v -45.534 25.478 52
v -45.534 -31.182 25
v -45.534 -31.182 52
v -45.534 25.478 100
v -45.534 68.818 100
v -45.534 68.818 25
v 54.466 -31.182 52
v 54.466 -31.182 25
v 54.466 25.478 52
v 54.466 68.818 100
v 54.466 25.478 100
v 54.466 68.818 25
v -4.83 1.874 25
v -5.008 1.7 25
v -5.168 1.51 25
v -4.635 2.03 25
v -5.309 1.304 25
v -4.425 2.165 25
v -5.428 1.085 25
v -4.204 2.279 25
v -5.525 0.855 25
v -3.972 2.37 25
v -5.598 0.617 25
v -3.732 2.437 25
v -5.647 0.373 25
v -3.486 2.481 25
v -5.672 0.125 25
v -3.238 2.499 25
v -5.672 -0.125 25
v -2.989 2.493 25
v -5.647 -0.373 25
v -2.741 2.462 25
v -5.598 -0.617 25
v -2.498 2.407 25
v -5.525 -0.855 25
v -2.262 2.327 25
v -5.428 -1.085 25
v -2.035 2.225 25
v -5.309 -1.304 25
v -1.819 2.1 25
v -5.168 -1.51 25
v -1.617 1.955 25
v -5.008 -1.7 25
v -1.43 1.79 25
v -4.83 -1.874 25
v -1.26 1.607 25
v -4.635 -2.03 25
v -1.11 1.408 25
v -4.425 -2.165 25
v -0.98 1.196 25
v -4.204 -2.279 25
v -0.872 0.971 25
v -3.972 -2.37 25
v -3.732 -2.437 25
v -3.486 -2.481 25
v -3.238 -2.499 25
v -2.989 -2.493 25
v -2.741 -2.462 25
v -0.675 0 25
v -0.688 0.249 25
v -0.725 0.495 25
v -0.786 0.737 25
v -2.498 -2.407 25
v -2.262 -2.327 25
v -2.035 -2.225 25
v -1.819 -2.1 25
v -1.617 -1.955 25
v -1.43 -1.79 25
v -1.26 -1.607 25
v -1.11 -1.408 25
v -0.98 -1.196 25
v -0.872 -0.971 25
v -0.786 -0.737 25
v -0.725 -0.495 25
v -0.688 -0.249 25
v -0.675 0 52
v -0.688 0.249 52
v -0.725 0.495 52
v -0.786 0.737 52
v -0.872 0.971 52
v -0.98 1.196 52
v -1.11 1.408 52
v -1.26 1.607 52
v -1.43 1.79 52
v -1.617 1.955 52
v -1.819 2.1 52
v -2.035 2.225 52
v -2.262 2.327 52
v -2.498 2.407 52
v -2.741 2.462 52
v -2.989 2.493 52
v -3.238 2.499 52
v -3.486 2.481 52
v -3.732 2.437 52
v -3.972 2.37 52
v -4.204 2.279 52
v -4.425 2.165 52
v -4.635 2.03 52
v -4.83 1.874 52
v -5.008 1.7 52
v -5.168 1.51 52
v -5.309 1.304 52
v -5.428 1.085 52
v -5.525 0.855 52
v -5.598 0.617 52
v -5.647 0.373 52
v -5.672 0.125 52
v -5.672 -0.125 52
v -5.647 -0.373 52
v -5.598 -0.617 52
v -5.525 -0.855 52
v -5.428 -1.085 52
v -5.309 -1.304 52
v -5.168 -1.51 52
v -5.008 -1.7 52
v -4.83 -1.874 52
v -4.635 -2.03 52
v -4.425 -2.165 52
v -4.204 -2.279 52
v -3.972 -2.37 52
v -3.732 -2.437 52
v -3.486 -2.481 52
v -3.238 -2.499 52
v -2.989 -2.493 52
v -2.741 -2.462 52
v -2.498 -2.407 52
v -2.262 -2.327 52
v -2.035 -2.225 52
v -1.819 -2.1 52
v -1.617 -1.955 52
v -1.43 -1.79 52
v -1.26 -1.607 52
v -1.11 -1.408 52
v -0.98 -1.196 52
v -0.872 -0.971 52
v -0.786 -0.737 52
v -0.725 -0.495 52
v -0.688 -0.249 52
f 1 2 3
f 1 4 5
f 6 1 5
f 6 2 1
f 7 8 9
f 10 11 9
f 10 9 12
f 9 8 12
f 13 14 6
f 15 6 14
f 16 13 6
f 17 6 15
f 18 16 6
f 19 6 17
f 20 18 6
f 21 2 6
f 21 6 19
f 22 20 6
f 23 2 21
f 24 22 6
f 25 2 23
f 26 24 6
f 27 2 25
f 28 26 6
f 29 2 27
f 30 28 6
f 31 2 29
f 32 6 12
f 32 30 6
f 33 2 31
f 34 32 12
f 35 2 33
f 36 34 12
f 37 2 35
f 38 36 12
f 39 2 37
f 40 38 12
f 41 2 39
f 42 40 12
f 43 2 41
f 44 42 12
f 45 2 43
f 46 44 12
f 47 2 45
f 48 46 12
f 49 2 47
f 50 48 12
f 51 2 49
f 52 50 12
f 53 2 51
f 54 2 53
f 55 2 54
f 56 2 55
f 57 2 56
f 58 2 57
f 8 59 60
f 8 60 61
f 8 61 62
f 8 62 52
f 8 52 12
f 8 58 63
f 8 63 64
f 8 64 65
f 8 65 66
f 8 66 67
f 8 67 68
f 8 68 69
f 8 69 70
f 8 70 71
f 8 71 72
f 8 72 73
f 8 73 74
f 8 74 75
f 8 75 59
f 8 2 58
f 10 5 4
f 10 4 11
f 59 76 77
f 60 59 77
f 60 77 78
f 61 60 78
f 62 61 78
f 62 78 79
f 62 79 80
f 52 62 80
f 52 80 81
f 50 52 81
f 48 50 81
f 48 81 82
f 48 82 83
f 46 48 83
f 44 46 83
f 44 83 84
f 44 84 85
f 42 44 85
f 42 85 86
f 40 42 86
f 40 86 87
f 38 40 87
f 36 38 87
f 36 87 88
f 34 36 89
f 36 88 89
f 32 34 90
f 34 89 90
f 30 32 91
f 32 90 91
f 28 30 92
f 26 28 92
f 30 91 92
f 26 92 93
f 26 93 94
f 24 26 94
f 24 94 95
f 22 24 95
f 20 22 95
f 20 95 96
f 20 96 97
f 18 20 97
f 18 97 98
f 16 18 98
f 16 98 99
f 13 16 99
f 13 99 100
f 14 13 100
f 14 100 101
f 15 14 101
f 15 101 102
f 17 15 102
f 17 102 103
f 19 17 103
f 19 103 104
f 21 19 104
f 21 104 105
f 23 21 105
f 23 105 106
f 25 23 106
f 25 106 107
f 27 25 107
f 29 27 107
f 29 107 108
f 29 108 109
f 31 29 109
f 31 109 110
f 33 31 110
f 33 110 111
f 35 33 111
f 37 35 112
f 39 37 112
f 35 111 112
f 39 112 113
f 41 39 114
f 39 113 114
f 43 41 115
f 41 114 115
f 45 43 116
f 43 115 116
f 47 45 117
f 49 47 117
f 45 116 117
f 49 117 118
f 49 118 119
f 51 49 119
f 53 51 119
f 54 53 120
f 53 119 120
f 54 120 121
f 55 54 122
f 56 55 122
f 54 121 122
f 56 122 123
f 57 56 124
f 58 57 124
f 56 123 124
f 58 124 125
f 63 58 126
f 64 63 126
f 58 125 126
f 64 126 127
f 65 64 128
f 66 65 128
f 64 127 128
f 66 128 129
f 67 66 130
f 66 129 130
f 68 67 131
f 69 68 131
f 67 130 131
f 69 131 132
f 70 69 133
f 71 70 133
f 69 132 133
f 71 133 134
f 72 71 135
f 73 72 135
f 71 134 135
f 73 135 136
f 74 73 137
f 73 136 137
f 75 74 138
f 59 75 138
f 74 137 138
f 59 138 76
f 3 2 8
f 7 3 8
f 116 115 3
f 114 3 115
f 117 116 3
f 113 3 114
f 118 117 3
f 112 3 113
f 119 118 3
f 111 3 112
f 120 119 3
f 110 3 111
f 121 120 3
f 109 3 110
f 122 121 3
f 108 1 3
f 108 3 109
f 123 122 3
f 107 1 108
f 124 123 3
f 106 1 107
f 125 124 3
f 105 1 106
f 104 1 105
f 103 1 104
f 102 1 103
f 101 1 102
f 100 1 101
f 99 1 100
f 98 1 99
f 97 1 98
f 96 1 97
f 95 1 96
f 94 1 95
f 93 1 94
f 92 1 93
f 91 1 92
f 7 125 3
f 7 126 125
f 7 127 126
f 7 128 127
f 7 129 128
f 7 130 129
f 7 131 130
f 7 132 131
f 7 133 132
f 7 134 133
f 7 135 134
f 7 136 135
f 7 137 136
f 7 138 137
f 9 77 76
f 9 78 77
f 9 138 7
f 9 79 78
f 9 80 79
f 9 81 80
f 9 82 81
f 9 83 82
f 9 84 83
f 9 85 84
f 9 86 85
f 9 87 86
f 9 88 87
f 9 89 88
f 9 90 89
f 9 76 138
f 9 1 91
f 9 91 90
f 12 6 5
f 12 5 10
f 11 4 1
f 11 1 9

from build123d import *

# Parameters (mm, degrees)
F0_W     = 100
F0_H     = 100
F1_DEPTH = 100
F2_W     = 143.886555
F2_H     = 64.474793
F3_DEPTH = 48
F4_R     = 2.5
F5_DEPTH = 52.001
F6_W     = 124.598865
F6_H     = 122.024197
F7_DEPTH = 25


with BuildPart() as f1:
    # F0 (on Top) → F1 (new body)
    with BuildSketch(Plane.XY):
        with Locations((4.466346, 18.817768)):
            Rectangle(F0_W, F0_H)
    extrude(amount=F1_DEPTH)

    # F2 (on face) → F3 (cut)
    with BuildSketch(Plane.XY.offset(100)):
        with Locations((11.580882, -6.759453)):
            Rectangle(F2_W, F2_H)
    extrude(amount=-F3_DEPTH, mode=Mode.SUBTRACT)

    # F4 (on face) → F5 (cut, through all)
    with BuildSketch(Plane.XY.offset(52)):
        with Locations((-3.175375, 0)):
            Circle(F4_R)
    extrude(amount=-F5_DEPTH, mode=Mode.SUBTRACT)

    # F6 (on face) → F7 (cut)
    with BuildSketch(Plane(origin=(0, 0, 0), x_dir=(1, 0, 0), z_dir=(0, 0, -1))):
        with Locations((3.516642, -17.77996)):
            Rectangle(F6_W, F6_H)
    extrude(amount=-F7_DEPTH, mode=Mode.SUBTRACT)


solid = f1.part
